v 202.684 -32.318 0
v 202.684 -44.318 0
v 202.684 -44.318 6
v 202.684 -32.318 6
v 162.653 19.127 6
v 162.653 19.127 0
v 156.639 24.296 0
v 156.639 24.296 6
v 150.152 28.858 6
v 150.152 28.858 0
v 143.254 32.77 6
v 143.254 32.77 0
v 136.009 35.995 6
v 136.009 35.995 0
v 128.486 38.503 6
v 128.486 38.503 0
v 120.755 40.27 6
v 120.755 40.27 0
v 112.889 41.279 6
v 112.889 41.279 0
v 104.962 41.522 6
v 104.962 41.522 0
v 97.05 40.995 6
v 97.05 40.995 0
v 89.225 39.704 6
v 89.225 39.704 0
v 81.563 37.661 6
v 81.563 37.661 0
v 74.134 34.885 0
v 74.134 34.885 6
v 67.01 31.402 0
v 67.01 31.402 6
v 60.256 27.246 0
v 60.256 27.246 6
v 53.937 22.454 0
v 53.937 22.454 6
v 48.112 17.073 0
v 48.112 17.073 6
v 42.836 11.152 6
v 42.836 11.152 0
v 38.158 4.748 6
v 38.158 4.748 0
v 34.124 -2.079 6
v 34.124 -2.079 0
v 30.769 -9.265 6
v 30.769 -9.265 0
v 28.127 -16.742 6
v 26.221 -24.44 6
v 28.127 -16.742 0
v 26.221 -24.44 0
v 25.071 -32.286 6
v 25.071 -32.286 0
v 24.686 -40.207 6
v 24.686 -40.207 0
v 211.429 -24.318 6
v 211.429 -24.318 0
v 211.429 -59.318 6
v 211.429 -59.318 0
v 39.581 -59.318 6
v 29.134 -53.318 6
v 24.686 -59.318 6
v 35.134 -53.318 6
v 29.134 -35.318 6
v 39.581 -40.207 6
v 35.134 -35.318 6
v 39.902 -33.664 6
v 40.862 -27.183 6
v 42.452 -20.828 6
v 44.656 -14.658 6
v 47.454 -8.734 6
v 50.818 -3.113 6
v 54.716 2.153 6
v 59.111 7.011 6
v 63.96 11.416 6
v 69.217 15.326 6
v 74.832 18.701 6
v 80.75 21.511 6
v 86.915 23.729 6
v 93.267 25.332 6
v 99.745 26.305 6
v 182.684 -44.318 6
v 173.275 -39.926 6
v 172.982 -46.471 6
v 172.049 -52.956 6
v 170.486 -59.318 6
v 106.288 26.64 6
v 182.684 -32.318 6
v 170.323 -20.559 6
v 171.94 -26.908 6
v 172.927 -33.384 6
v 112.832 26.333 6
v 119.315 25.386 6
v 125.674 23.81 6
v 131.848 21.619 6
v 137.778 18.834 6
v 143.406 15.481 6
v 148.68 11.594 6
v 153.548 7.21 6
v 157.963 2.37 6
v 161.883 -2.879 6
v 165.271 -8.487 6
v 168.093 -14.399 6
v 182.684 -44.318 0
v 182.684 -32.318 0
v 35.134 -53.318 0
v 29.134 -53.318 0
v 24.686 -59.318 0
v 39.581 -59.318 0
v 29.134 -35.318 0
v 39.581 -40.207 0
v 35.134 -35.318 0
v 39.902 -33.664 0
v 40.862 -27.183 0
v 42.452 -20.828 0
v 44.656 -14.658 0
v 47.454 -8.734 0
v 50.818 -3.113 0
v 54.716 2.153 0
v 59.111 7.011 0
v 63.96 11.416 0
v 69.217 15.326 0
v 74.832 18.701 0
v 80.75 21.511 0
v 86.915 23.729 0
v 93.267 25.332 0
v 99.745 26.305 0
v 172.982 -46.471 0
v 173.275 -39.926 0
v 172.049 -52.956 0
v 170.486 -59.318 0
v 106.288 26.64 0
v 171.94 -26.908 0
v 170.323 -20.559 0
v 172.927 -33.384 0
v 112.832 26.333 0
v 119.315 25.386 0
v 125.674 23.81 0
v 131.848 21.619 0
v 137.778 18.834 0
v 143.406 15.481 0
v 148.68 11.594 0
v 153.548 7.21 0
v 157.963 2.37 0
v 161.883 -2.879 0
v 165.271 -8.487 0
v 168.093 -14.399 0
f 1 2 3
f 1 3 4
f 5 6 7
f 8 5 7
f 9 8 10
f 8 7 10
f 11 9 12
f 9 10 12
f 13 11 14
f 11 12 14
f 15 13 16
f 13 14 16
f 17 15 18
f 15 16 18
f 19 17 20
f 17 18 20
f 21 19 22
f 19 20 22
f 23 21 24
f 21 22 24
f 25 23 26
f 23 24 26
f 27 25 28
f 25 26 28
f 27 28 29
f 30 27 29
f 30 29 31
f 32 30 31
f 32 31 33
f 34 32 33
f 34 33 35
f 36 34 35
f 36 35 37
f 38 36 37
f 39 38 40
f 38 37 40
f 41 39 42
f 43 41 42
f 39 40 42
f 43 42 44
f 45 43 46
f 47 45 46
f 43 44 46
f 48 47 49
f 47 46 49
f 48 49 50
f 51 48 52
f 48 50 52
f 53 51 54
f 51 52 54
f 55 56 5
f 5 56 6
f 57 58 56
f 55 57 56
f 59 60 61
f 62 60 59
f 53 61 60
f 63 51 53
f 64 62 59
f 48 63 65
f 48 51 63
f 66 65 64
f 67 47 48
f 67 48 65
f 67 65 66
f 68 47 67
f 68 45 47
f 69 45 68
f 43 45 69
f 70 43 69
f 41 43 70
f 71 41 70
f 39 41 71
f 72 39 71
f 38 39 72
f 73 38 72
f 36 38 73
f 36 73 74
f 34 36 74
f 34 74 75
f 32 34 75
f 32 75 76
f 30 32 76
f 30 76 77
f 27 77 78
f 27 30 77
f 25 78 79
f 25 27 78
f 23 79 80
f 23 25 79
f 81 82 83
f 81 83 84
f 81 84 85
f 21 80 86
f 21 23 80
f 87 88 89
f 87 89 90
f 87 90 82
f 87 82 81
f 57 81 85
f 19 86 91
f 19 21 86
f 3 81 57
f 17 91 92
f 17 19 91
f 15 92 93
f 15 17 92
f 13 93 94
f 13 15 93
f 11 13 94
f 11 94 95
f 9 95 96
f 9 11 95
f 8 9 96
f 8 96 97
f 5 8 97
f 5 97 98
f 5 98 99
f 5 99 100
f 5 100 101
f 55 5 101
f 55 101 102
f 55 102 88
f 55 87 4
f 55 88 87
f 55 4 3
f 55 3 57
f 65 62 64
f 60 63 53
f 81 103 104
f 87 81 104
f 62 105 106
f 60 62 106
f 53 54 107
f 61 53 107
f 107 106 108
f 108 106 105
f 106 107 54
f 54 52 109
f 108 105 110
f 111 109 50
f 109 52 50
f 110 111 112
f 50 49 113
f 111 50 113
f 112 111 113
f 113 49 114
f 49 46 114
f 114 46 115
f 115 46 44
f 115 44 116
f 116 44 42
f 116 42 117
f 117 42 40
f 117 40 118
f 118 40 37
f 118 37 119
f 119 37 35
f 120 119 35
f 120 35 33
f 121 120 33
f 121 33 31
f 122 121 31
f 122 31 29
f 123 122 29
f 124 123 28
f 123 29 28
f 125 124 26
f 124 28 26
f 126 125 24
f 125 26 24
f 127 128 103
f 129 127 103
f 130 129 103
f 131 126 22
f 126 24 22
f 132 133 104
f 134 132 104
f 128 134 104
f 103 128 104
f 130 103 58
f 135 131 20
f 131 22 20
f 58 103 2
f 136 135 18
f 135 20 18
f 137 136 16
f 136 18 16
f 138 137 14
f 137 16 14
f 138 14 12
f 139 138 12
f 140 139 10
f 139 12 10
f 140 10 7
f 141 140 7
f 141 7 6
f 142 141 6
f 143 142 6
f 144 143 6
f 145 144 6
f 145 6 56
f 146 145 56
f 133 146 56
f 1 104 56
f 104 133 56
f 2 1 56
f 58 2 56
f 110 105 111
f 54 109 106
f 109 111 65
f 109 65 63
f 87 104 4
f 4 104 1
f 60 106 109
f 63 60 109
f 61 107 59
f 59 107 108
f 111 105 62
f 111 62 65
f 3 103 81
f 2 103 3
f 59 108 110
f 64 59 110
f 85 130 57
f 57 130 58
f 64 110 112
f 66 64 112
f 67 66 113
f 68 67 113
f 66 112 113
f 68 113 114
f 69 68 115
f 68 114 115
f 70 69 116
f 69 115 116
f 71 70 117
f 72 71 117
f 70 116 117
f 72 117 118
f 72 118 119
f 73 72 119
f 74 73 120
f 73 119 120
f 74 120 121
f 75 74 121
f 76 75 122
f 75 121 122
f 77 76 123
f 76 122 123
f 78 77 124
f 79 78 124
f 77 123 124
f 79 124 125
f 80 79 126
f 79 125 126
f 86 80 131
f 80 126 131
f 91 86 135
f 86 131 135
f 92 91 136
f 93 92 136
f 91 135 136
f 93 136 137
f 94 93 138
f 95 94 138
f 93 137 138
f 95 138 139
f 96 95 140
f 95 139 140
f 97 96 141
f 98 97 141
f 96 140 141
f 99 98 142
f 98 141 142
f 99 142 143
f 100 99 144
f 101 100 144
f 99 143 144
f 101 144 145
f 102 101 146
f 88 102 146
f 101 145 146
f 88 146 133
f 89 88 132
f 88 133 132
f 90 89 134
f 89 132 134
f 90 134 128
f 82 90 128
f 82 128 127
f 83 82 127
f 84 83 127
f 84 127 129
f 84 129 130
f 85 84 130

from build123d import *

# Parameters (mm, degrees)
SKETCH1_W           = 20
SKETCH1_H           = 12
BOSS_EXTRUDE1_DEPTH = 6
SKETCH2_W           = 6
SKETCH2_H           = 18
CUT_EXTRUDE1_DEPTH  = 10


with BuildPart() as part:
    # Sketch1 → Boss-Extrude1 (new body)
    with BuildSketch(Plane.XY):
        with BuildLine():
            Line((211.428617248, -24.317756725), (162.653205504, 19.127417073))
            ThreePointArc((162.653205504, 19.127417073), (74.134115414, 34.8851986), (24.686380191, -40.207134366))
            Line((24.686380191, -40.207134366), (24.686380191, -59.317756725))
            Line((24.686380191, -59.317756725), (39.581295698, -59.317756725))
            Line((39.581295698, -59.317756725), (39.581295698, -40.207134366))
            ThreePointArc((39.581295698, -40.207134366), (116.085216489, 25.939025685), (170.486001767, -59.317756725))
            Line((170.486001767, -59.317756725), (211.428617248, -59.317756725))
            Line((211.428617248, -59.317756725), (211.428617248, -24.317756725))
        make_face()
        with Locations((192.683627049, -38.317756725)):
            Rectangle(SKETCH1_W, SKETCH1_H, mode=Mode.SUBTRACT)
    extrude(amount=BOSS_EXTRUDE1_DEPTH)

    # Sketch2 → Cut-Extrude1 (cut)
    with BuildSketch(Plane(origin=(0, 0, 0), x_dir=(-1, 0, 0), z_dir=(0, 0, -1))):
        with Locations((-32.133837945, -44.317756725)):
            Rectangle(SKETCH2_W, SKETCH2_H)
    extrude(amount=-CUT_EXTRUDE1_DEPTH, mode=Mode.SUBTRACT)


solid = part.part
